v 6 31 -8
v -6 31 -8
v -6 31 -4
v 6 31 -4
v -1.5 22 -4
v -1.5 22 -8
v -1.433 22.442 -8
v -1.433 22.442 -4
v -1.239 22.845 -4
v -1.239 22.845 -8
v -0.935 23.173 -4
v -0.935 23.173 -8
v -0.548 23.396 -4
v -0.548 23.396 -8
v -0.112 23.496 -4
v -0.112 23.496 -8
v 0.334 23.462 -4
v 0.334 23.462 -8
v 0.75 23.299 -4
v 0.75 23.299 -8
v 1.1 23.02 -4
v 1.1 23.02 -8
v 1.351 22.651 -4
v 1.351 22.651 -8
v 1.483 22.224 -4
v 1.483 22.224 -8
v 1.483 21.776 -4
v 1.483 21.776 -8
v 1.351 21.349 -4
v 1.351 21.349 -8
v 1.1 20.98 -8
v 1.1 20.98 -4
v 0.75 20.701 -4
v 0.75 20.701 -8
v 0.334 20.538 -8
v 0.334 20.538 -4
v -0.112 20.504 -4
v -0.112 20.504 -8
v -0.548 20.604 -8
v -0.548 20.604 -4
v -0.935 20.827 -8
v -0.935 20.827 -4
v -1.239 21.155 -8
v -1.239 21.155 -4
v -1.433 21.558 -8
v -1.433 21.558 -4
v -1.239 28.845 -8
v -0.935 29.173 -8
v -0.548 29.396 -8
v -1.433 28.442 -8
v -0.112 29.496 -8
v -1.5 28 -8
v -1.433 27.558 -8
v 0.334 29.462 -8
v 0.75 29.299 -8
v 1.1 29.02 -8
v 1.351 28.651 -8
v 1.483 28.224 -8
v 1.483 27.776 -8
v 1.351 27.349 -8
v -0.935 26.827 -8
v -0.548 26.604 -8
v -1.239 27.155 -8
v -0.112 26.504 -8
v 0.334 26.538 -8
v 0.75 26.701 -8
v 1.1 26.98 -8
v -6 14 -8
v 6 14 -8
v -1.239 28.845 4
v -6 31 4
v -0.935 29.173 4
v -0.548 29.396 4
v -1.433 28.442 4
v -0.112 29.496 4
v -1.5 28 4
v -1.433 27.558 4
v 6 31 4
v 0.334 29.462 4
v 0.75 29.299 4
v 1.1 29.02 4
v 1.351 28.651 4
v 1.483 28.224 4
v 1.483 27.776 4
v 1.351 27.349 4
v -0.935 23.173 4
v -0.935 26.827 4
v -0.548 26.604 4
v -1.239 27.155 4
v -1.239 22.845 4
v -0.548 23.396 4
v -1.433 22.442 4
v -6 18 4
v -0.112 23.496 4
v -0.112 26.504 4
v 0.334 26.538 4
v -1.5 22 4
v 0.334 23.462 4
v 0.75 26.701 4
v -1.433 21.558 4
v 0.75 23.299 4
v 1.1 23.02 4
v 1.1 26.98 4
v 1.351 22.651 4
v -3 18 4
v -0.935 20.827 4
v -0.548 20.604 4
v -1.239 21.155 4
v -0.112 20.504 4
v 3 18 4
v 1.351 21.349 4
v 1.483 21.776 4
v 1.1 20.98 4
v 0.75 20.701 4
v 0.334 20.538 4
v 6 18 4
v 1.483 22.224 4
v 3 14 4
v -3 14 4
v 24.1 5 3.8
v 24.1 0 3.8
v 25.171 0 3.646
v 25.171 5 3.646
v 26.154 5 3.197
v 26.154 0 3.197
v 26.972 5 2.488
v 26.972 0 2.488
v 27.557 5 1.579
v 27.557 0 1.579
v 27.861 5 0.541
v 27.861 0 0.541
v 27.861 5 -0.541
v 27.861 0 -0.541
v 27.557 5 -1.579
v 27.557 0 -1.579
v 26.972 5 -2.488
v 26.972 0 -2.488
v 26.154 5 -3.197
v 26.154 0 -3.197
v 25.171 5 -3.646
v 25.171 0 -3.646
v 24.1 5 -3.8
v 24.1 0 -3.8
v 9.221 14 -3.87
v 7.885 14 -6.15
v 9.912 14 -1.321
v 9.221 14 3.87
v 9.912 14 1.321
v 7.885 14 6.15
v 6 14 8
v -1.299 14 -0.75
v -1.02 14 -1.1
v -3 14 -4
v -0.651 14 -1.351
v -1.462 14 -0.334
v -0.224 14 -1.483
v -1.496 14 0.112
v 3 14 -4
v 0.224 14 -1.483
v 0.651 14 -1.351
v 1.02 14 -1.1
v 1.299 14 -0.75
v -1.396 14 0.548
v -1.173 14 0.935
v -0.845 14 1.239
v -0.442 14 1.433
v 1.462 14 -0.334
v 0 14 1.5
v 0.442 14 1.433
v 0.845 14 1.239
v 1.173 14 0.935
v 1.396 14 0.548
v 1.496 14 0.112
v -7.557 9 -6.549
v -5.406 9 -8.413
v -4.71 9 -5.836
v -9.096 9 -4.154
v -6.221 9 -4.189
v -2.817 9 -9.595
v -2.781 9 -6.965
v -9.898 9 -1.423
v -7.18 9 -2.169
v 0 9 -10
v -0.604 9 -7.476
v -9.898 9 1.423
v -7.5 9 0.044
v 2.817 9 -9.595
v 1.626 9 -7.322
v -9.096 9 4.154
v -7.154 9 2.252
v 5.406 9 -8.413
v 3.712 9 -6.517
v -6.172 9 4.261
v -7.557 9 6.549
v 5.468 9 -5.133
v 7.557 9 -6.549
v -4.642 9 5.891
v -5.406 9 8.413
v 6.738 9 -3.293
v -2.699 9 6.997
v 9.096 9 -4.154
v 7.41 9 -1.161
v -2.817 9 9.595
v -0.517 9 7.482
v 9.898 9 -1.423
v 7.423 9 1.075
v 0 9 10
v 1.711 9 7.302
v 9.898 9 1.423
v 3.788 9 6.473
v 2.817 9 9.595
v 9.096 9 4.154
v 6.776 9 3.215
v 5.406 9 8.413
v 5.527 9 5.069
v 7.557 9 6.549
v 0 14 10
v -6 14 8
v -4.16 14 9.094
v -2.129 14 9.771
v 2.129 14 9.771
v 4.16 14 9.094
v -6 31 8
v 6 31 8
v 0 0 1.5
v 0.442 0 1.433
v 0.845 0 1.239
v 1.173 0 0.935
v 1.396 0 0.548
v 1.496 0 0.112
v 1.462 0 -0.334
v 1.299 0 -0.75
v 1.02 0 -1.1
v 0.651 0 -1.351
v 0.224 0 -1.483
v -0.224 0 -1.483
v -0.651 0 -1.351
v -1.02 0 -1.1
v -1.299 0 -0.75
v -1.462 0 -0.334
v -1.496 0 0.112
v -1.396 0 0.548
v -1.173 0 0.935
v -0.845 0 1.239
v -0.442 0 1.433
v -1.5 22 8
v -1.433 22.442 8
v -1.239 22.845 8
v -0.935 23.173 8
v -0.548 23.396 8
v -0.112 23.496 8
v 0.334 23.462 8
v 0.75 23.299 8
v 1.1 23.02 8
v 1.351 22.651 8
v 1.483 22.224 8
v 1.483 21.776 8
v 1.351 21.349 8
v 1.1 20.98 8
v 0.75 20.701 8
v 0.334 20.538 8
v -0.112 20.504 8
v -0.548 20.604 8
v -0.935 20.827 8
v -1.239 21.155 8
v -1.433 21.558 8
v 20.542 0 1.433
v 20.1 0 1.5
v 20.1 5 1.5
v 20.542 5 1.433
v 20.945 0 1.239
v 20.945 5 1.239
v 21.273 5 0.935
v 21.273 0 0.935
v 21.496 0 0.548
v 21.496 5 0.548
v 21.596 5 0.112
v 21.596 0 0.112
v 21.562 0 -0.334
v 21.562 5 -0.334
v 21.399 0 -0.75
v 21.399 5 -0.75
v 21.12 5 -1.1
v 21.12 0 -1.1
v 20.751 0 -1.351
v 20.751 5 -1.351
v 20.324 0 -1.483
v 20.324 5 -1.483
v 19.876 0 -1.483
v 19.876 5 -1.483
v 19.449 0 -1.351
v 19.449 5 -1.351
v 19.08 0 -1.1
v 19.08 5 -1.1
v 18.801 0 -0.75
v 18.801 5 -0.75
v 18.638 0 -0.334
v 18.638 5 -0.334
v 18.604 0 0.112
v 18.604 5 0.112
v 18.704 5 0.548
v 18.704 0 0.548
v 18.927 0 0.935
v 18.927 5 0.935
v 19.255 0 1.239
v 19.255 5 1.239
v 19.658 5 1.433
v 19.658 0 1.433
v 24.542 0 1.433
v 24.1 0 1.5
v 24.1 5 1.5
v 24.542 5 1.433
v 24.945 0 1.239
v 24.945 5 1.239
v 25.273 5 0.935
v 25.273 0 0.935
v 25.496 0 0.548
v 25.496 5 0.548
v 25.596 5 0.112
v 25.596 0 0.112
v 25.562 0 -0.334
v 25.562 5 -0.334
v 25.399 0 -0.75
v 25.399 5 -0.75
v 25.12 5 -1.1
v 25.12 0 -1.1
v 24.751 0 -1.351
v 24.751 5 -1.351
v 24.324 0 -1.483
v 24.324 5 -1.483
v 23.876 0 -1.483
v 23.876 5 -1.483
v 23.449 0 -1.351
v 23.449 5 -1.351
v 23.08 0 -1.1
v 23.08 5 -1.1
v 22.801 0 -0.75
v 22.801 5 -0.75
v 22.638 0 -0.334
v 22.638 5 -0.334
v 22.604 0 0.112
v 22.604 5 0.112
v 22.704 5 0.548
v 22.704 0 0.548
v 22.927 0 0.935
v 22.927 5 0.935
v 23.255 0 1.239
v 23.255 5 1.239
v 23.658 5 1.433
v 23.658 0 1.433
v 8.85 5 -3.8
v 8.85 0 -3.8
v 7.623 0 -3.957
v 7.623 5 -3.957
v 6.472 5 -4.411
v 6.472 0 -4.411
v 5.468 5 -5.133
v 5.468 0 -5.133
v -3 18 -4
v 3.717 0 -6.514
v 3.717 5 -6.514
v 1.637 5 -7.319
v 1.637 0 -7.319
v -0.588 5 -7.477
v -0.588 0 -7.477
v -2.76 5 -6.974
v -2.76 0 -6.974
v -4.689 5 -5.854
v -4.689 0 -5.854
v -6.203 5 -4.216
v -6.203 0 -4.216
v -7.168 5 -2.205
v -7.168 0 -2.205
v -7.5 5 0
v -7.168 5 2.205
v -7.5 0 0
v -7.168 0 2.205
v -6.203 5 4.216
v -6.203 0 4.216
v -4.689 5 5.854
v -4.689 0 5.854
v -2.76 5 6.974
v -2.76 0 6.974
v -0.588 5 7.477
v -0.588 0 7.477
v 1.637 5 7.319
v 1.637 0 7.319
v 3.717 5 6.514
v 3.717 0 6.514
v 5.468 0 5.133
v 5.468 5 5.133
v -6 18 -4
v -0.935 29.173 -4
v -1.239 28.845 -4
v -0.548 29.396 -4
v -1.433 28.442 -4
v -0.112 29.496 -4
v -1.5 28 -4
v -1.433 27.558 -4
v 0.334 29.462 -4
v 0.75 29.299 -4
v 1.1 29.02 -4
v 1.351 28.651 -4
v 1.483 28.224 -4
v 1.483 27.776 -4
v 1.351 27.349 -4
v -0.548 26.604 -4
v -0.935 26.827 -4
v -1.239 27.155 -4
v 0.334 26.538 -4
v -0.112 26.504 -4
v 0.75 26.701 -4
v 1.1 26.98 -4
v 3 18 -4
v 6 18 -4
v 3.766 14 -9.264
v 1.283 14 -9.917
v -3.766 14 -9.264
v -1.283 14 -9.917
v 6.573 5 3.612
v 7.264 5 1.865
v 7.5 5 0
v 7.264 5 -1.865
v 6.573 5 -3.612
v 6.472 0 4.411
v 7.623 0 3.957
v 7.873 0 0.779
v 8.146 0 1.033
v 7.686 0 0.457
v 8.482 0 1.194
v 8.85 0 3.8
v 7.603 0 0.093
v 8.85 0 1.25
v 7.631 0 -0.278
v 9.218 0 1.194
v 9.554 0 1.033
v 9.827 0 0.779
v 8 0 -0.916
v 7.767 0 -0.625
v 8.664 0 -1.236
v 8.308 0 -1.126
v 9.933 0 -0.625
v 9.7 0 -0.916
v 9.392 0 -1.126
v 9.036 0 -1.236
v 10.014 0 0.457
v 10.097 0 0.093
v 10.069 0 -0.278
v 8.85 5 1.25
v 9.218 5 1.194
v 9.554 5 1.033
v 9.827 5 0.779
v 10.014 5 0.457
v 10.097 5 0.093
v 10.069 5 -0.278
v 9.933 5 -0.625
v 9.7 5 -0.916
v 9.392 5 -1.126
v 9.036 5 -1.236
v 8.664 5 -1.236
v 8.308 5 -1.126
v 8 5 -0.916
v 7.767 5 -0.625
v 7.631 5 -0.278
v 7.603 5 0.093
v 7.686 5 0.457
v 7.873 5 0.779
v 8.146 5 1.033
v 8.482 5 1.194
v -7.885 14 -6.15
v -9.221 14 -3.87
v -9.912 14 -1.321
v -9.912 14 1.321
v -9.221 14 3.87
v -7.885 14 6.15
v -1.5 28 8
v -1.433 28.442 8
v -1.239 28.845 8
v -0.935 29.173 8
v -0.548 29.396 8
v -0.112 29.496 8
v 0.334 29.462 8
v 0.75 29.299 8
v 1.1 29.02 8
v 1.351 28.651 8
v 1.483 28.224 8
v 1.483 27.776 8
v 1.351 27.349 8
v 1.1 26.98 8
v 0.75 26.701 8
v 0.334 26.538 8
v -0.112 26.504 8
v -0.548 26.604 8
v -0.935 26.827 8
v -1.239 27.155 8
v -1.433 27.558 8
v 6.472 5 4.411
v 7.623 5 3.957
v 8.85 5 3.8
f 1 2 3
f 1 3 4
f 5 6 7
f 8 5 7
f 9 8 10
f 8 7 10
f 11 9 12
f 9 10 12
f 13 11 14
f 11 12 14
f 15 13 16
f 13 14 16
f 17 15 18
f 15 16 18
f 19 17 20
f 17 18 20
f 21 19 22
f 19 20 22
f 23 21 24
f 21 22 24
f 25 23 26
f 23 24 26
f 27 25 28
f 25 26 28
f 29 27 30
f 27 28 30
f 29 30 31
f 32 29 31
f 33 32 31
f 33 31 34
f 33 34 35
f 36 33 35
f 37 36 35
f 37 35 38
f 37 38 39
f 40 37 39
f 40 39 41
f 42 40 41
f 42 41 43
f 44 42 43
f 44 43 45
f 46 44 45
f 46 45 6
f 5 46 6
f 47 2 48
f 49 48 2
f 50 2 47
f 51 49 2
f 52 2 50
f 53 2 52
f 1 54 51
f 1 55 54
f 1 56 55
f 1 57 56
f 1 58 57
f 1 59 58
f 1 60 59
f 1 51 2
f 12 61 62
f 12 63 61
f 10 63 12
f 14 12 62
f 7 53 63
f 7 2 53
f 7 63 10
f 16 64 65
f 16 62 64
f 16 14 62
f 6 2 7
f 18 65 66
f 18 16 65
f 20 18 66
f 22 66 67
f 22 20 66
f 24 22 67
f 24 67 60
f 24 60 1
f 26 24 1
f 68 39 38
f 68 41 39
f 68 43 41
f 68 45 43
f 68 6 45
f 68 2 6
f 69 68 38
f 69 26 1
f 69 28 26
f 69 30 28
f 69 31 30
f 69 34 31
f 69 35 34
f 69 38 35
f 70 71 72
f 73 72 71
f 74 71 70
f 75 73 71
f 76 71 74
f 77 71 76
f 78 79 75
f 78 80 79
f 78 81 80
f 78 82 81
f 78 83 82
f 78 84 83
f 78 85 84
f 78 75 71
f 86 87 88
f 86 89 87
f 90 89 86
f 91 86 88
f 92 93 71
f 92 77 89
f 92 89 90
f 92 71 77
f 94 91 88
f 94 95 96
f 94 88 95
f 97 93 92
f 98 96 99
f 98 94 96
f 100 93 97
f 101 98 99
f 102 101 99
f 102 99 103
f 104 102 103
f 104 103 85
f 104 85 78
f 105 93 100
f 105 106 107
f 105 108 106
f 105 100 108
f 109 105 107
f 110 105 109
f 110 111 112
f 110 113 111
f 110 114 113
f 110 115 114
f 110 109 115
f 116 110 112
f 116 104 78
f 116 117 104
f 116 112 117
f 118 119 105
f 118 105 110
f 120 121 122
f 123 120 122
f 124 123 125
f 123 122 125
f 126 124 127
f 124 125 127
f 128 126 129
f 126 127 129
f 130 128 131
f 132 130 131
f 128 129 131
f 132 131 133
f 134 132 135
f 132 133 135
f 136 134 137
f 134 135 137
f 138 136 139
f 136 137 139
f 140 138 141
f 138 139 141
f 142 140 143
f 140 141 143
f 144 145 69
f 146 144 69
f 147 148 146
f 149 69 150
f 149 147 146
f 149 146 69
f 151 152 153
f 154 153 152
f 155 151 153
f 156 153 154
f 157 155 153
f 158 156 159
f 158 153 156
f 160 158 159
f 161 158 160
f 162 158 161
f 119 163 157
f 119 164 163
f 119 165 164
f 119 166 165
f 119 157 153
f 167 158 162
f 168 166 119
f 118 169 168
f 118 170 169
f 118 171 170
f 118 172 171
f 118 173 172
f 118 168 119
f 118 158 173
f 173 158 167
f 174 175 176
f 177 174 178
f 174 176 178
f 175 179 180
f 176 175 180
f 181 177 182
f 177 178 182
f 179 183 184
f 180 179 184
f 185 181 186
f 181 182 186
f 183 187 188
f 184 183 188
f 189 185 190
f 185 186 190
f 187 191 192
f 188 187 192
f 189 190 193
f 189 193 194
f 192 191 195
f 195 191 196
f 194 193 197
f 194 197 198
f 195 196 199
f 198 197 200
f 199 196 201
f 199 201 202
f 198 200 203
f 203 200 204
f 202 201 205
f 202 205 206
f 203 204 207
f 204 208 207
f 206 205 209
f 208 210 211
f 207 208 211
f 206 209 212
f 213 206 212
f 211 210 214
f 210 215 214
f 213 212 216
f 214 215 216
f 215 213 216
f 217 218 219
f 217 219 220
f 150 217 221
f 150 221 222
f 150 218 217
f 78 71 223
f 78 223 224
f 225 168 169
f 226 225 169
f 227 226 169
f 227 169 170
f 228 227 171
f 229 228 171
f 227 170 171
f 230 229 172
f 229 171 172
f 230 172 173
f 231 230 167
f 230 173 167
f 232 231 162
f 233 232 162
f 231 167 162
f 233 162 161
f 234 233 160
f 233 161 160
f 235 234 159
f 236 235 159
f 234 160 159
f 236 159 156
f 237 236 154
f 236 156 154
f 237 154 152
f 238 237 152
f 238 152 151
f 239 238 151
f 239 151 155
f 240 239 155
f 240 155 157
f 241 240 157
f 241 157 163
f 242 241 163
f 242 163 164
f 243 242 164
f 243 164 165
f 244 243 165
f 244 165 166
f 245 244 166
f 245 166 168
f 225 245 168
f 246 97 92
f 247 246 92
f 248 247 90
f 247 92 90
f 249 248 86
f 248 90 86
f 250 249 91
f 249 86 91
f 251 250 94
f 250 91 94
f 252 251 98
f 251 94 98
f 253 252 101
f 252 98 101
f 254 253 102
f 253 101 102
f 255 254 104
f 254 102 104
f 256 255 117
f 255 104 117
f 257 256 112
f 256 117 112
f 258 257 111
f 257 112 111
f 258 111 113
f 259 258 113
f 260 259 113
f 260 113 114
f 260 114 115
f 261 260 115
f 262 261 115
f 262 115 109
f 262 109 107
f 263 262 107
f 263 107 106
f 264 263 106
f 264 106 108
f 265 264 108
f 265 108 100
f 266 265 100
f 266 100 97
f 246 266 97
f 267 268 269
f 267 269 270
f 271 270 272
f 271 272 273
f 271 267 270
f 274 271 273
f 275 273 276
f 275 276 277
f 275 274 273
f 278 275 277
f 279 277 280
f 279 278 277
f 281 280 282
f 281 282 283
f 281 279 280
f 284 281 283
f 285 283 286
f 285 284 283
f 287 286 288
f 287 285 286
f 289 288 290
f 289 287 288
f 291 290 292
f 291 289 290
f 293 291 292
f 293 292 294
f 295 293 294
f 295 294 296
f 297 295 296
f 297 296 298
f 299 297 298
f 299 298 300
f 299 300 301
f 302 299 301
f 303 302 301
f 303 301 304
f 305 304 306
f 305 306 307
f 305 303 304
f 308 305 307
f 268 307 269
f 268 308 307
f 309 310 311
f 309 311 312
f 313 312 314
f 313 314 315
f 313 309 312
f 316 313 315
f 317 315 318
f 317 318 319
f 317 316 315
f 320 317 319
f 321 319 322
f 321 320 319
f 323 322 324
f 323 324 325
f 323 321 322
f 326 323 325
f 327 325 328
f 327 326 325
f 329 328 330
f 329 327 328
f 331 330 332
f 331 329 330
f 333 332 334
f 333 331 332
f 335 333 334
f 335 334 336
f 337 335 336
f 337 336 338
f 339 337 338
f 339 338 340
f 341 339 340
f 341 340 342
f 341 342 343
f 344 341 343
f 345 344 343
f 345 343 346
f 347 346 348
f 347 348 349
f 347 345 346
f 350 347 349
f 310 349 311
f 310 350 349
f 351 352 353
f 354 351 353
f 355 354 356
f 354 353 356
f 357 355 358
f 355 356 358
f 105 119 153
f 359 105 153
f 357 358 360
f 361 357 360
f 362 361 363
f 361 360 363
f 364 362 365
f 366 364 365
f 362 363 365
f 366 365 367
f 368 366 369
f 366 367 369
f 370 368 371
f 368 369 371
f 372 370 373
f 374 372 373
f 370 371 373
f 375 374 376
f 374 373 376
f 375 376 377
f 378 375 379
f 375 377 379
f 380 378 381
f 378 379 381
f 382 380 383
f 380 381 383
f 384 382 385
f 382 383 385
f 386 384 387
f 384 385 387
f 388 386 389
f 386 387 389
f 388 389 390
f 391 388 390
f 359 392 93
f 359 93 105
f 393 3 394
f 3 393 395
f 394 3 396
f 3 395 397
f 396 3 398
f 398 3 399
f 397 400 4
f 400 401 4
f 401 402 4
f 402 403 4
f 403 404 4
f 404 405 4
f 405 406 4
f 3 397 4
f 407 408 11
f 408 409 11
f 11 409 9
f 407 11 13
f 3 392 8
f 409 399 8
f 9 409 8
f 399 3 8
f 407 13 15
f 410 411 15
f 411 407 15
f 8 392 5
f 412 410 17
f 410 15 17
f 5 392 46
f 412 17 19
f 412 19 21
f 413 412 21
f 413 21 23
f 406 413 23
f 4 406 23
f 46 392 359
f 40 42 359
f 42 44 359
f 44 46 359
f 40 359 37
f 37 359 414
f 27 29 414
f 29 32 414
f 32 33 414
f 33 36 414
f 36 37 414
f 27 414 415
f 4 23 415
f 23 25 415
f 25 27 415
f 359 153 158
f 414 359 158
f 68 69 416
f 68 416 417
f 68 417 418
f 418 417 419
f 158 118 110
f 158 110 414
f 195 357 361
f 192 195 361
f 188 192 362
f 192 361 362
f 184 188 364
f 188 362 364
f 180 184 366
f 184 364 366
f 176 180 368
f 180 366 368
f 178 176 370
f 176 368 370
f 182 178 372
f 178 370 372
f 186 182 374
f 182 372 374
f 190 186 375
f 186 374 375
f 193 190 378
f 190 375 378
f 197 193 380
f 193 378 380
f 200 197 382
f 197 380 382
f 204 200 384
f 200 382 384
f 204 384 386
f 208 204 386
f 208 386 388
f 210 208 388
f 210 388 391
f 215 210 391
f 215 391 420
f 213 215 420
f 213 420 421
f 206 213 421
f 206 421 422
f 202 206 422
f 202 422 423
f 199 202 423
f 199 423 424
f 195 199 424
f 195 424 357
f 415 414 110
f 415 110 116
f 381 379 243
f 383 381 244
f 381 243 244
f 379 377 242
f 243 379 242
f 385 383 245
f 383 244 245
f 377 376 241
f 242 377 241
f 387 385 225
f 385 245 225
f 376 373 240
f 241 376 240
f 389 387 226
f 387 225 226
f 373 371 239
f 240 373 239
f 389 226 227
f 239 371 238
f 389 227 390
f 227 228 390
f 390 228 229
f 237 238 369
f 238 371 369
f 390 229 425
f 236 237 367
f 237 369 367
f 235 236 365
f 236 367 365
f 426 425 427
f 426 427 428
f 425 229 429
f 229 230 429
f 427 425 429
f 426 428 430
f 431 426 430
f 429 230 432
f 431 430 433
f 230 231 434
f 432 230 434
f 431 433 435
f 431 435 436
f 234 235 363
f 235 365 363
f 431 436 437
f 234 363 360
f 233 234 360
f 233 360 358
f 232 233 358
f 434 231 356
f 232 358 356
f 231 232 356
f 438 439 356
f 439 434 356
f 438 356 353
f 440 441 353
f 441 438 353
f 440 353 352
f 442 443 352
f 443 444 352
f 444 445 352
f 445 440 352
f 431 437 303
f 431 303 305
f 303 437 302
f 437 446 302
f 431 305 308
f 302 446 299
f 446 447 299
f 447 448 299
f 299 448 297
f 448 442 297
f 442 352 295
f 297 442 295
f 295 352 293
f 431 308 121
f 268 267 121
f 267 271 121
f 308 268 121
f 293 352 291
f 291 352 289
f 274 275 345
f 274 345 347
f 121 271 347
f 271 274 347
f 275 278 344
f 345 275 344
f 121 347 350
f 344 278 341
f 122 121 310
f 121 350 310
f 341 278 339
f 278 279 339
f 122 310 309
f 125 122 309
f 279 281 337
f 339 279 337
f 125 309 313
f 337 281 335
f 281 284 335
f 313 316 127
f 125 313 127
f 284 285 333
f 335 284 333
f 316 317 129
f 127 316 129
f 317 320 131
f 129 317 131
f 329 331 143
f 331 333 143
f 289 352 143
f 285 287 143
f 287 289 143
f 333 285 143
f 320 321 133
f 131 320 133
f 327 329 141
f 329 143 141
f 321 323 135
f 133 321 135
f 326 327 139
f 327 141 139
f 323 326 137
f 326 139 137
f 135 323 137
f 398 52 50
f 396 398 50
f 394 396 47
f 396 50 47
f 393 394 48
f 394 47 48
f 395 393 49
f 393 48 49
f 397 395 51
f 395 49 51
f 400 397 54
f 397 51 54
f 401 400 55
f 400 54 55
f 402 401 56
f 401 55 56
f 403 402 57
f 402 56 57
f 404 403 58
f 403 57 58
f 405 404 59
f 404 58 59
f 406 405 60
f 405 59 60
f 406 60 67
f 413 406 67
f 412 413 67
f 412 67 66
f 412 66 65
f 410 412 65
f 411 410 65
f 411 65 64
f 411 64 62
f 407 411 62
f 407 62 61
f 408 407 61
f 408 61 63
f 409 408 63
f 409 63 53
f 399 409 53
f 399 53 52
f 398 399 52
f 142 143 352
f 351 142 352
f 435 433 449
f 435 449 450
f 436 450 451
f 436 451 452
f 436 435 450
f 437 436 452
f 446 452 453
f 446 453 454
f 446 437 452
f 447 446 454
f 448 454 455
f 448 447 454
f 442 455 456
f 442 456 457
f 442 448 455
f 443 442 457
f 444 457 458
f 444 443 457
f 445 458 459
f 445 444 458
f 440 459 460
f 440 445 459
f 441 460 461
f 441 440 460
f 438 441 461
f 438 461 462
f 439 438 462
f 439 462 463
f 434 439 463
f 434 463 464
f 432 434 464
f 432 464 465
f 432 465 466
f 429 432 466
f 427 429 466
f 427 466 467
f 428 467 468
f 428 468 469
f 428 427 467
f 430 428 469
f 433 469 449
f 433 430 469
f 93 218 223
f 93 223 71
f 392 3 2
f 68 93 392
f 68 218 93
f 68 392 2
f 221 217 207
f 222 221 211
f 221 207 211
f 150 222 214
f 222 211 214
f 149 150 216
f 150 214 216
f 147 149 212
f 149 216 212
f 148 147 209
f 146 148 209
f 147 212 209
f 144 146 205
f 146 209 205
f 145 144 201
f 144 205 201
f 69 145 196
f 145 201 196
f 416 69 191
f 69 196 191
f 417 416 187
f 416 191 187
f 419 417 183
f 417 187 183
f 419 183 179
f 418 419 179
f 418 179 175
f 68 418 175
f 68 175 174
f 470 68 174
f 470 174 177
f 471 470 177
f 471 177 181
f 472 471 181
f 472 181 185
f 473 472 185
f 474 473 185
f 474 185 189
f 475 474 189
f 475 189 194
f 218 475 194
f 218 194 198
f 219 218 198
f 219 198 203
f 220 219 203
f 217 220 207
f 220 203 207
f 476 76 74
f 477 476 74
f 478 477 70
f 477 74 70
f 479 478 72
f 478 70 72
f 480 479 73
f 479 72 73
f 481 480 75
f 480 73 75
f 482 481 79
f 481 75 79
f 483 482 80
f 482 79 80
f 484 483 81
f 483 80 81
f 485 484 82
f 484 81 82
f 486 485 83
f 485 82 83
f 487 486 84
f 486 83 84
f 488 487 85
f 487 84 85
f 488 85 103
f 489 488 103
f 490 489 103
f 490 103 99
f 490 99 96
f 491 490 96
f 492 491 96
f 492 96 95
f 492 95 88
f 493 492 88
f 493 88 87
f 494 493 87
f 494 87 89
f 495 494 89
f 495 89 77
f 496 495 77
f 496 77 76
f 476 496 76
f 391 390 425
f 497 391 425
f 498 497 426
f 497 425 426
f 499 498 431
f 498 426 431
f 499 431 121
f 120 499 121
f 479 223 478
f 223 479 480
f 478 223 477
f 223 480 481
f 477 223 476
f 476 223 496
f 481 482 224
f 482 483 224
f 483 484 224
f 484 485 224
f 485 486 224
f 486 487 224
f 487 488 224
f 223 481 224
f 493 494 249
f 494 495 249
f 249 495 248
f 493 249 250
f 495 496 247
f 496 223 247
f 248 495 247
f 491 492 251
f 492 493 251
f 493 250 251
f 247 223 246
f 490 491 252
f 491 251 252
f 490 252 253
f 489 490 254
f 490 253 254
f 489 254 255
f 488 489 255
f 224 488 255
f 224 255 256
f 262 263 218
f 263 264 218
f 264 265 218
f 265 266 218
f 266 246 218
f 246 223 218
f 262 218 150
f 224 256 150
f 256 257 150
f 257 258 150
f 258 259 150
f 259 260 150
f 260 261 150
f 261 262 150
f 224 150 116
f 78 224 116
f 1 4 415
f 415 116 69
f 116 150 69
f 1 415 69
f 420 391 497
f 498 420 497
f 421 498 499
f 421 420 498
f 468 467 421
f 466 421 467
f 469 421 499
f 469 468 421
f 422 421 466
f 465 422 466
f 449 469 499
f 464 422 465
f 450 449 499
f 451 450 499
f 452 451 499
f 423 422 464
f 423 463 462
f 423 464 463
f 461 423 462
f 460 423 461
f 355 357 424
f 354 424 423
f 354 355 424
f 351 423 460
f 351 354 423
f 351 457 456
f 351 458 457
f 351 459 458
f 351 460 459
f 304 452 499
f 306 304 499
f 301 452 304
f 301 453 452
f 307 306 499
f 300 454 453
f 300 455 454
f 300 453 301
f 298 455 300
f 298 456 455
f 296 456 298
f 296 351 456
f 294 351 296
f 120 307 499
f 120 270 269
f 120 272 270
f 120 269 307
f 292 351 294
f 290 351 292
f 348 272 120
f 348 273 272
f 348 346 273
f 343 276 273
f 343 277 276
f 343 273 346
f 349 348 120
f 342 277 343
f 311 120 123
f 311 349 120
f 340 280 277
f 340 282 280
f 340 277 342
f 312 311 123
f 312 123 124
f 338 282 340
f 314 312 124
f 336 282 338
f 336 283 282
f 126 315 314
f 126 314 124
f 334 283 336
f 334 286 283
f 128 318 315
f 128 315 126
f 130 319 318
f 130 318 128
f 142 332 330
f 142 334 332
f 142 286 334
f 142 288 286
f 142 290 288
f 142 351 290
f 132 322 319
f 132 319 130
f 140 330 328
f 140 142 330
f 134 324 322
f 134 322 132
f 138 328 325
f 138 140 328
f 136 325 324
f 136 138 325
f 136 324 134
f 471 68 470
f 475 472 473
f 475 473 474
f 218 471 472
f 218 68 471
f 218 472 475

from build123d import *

# Parameters (mm, degrees)
SKETCH3_R                = 1.25
SKETCH3_R_2              = 1.5
BOSS_EXTRUDE9_DEPTH      = 5
SKETCH4_R                = 7.5
BOSS_EXTRUDE10_DEPTH     = 4
SKETCH5_R                = 10
BOSS_EXTRUDE11_DEPTH     = 5
SKETCH6_R                = 1.5
CUT_EXTRUDE1_DEPTH       = 33.778193971
SKETCH7_W                = 12
SKETCH7_H                = 4
BOSS_EXTRUDE12_DEPTH     = 17
SKETCH8_W                = 3
SKETCH8_H                = 8
BOSS_EXTRUDE13_DEPTH     = 4
F_3_0_3_DIAMETER_HOLE1_D = 3


with BuildPart() as part:
    # Sketch3 → Boss-Extrude9 (new body)
    with BuildSketch(Plane(origin=(0, 0, 0), x_dir=(1, 0, 0), z_dir=(0, 1, 0))):
        with BuildLine():
            Line((24.1, 3.8), (8.85, 3.8))
            ThreePointArc((8.85, 3.8), (7.033595607, 4.14837388), (5.468099348, 5.133214346))
            ThreePointArc((5.468099348, 5.133214346), (-7.5, 0), (5.468099348, -5.133214346))
            ThreePointArc((5.468099348, -5.133214346), (7.033595607, -4.14837388), (8.85, -3.8))
            Line((8.85, -3.8), (24.1, -3.8))
            ThreePointArc((24.1, -3.8), (27.9, 0), (24.1, 3.8))
        make_face()
        with Locations((8.85, 0)):
            Circle(SKETCH3_R, mode=Mode.SUBTRACT)
        with Locations((20.1, 0)):
            Circle(SKETCH3_R_2, mode=Mode.SUBTRACT)
        with Locations((24.1, 0)):
            Circle(SKETCH3_R_2, mode=Mode.SUBTRACT)
    extrude(amount=BOSS_EXTRUDE9_DEPTH)

    # Sketch4 → Boss-Extrude10 (add)
    with BuildSketch(Plane(origin=(0, 5, 0), x_dir=(1, 0, 0), z_dir=(0, 1, 0))):
        Circle(SKETCH4_R)
    extrude(amount=BOSS_EXTRUDE10_DEPTH)

    # Sketch5 → Boss-Extrude11 (add)
    with BuildSketch(Plane(origin=(0, 9, 0), x_dir=(1, 0, 0), z_dir=(0, 1, 0))):
        Circle(SKETCH5_R)
    extrude(amount=BOSS_EXTRUDE11_DEPTH)

    # Sketch6 → Cut-Extrude1 (cut, through all)
    with BuildSketch(Plane(origin=(0, 14, 0), x_dir=(1, 0, 0), z_dir=(0, 1, 0))):
        Circle(SKETCH6_R)
    extrude(amount=-CUT_EXTRUDE1_DEPTH, mode=Mode.SUBTRACT)

    # Sketch7 → Boss-Extrude12 (add)
    with BuildSketch(Plane(origin=(0, 14, 0), x_dir=(1, 0, 0), z_dir=(0, 1, 0))):
        with Locations((0, -6)):
            Rectangle(SKETCH7_W, SKETCH7_H)
        with Locations((0, 6)):
            Rectangle(SKETCH7_W, SKETCH7_H)
    extrude(amount=BOSS_EXTRUDE12_DEPTH)

    # Sketch8 → Boss-Extrude13 (add)
    with BuildSketch(Plane(origin=(0, 14, 0), x_dir=(1, 0, 0), z_dir=(0, 1, 0))):
        with Locations((4.5, 0)):
            Rectangle(SKETCH8_W, SKETCH8_H)
        with Locations((-4.5, 0)):
            Rectangle(SKETCH8_W, SKETCH8_H)
    extrude(amount=BOSS_EXTRUDE13_DEPTH)

    # Ø3.0 (3) Diameter Hole1 (through all)
    with Locations(Plane.XY.offset(8)):
        with Locations((0, 28), (0, 22)):
            Hole(F_3_0_3_DIAMETER_HOLE1_D / 2)


solid = part.part
